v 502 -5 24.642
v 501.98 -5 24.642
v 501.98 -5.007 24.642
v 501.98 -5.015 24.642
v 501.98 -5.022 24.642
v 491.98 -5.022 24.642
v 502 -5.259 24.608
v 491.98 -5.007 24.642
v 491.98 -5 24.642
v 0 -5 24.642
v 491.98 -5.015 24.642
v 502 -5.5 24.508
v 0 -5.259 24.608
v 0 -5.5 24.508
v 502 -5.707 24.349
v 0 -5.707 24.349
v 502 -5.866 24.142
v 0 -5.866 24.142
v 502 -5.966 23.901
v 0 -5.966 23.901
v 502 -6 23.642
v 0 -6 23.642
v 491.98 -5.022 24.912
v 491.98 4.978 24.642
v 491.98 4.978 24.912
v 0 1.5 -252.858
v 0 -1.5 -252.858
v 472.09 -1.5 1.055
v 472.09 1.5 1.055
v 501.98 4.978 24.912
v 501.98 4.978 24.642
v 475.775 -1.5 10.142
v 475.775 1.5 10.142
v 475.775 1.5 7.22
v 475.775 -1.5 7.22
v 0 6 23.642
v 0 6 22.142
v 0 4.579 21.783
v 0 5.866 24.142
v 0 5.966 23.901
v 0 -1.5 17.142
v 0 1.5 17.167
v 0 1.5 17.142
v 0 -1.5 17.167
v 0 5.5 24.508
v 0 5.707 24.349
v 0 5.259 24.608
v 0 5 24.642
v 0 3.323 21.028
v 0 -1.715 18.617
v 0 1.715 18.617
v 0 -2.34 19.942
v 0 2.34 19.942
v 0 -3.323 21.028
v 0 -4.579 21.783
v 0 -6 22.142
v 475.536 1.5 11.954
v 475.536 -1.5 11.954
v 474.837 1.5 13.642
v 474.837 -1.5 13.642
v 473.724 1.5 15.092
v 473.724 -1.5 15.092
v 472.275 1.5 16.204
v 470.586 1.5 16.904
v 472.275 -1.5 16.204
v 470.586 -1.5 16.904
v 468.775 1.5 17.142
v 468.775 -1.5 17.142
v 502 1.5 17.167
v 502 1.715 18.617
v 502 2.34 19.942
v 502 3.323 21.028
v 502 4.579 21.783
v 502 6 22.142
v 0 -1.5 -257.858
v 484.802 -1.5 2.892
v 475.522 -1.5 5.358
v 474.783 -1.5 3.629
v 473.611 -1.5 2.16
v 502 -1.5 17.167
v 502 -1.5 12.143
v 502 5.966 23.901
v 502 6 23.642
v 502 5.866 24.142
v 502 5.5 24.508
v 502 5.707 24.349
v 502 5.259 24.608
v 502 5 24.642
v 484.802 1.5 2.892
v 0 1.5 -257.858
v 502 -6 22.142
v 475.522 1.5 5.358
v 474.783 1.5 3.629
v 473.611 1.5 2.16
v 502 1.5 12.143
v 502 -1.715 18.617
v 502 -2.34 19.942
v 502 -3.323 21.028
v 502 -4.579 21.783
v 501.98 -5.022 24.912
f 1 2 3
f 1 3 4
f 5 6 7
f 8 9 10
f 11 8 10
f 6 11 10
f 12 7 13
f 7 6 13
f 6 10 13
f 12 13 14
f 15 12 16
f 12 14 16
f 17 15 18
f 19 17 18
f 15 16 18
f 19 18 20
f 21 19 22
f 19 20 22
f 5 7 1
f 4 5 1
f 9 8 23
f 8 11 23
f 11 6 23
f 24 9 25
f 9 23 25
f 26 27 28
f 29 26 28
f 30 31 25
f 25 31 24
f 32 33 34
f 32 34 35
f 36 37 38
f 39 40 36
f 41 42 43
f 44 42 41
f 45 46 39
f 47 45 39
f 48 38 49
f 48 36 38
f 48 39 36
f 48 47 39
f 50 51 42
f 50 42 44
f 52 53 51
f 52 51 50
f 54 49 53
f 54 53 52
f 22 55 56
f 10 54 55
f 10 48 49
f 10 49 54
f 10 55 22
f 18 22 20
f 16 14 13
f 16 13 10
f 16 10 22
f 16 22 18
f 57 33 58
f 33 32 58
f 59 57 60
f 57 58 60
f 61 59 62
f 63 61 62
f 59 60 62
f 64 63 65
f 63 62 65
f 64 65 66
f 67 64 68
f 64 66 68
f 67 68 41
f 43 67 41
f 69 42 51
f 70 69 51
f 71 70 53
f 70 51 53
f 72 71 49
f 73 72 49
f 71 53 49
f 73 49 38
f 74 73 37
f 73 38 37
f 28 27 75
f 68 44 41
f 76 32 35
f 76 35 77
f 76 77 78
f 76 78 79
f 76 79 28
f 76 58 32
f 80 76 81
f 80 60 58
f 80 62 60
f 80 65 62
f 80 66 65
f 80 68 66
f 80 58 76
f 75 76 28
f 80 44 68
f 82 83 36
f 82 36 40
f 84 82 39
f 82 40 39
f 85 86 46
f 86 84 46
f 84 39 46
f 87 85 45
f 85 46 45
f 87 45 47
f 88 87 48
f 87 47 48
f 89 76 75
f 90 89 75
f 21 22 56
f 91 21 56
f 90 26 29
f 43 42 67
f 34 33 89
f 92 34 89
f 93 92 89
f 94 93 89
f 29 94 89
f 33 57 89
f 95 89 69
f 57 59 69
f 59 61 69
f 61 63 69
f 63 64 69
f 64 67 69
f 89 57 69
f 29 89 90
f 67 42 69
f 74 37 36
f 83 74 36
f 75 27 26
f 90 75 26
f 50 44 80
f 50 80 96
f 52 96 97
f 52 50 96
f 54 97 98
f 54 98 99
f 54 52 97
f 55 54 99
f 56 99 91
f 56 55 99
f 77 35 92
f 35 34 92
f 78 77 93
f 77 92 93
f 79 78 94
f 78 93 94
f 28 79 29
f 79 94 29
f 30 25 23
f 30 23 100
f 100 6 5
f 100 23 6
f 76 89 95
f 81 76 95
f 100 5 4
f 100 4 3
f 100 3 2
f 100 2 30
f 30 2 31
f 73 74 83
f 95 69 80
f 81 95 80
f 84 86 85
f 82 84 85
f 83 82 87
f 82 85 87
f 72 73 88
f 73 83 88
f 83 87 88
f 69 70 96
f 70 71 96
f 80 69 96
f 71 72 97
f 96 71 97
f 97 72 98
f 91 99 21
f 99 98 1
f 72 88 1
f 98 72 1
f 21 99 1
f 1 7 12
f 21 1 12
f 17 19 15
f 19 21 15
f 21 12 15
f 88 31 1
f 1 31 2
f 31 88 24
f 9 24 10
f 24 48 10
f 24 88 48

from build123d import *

# Parameters (mm, degrees)
F1_DEPTH      = 502
F3_DEPTH      = 406
F4_DEPTH      = 143
F5_W          = 26.22529459
F5_H          = 3
F6_DEPTH      = 14.25
F6_DEPTH_BACK = 0.8
F8_DEPTH      = 25
F10_DEPTH     = 0.27
F11_R         = 7
F12_R         = 7
F13_T1_DEPTH  = 502
F14_T1_DEPTH  = 502
F15_T1_DEPTH  = 507
F15_T6_DEPTH  = 507
F15_T12_DEPTH = 507
F15_T18_DEPTH = 507
F15_T25_DEPTH = 507
F15_T31_DEPTH = 507


# Not quite as in the source:
# - a fillet or chamfer that OpenCascade refuses, or shapes differently, is made with other operations: its cross-section is extruded or revolved along the edge and cut away or added
# - a feature names something its author has since deleted; it is built from what else it names


with BuildPart() as f1:
    # F0 (on Right) → F1 (new body)
    with BuildSketch(Plane.YZ):
        Polygon((6, 24.6420782059), (-6, 24.6420782059), (-6, 22.1420782059), (-1.5, 22.1420782059), (-1.5, -257.8579217941), (1.5, -257.8579217941), (1.5, 22.1420782059), (6, 22.1420782059), align=None)
    extrude(amount=F1_DEPTH)

    # F2 (on face) → F3 (cut)
    with BuildSketch(Plane.XZ.offset(1.5)):
        Polygon((0, -252.8579217941), (502, 17.1420782059), (0, 17.1420782059), align=None)
    extrude(amount=-F3_DEPTH, mode=Mode.SUBTRACT)

    # F2 (on face) → F4 (cut)
    with BuildSketch(Plane.XZ.offset(1.5)):
        Polygon((502, -257.8579217941), (502, 12.1420782059), (0, -257.8579217941), align=None)
    extrude(amount=-F4_DEPTH, mode=Mode.SUBTRACT)

    # F5 (on face) → F6 (join, two sides)
    with BuildSketch(Plane(origin=(0, 0, 17.1420782059), x_dir=(1, 0, 0), z_dir=(0, 0, -1))) as f6_sk:
        with Locations((488.887352705, 0)):
            Rectangle(F5_W, F5_H)
    extrude(amount=F6_DEPTH)
    extrude(f6_sk.sketch, amount=-F6_DEPTH_BACK)

    # F7 (on face) → F8 (cut)
    with BuildSketch(Plane(origin=(0, 1.5, 0), x_dir=(-1, 0, 0), z_dir=(0, 1, 0))):
        Polygon((-484.8018518519, 2.8920782059), (-502, 12.143202126), (-502, 2.8920782059), align=None)
    extrude(amount=-F8_DEPTH, mode=Mode.SUBTRACT)

    # F9 (on face) → F10 (join)
    with BuildSketch(Plane.XY.offset(24.6420782059)):
        Polygon((501.9800190187, -5.0222751118), (501.9800190187, 4.9777248882), (497.843503952, 4.9777248882), (491.9800190187, 4.9777248882), (491.9800190187, -5.0222751118), (496.5066611767, -5.0222751118), align=None)
    extrude(amount=F10_DEPTH)

    # F11
    f11_edges = [f1.edges().sort_by_distance(p)[0] for p in [
        (475.774705, 0, 17.142078),
    ]]
    fillet(f11_edges, radius=F11_R)

    # F12
    f12_edges = [f1.edges().sort_by_distance(p)[0] for p in [
        (475.774705, 0, 3.03684),
    ]]
    fillet(f12_edges, radius=F12_R)

    # F13: fillet of radius 5 on 1 edges, made by hand

    # F13_s2 → F13_t1 (join)
    with BuildSketch(Plane.YZ):
        with BuildLine():
            ThreePointArc((1.5, 17.1671410204), (2.7919007565, 20.5212429867), (6, 22.1420782059))
            Line((6, 22.1420782059), (1.5, 22.1420782059))
            Line((1.5, 22.1420782059), (1.5, 17.1671410204))
        make_face()
    extrude(amount=F13_T1_DEPTH)

    # F14: fillet of radius 5 on 1 edges, made by hand

    # F14_s2 → F14_t1 (join)
    with BuildSketch(Plane.YZ):
        with BuildLine():
            ThreePointArc((-1.5, 17.1671410204), (-2.7919007565, 20.5212429867), (-6, 22.1420782059))
            Line((-6, 22.1420782059), (-1.5, 22.1420782059))
            Line((-1.5, 22.1420782059), (-1.5, 17.1671410204))
        make_face()
    extrude(amount=F14_T1_DEPTH)

    # F15: fillet of radius 1 on 2 edges, made by hand

    # F15_s2 → F15_t1 (cut)
    with BuildSketch(Plane.YZ.offset(-2.5)):
        with BuildLine():
            ThreePointArc((6, 23.6420782059), (5.7071067812, 24.3491849871), (5, 24.6420782059))
            Line((5, 24.6420782059), (6, 24.6420782059))
            Line((6, 24.6420782059), (6, 23.6420782059))
        make_face()
    extrude(amount=F15_T1_DEPTH, mode=Mode.SUBTRACT)


with BuildPart() as f15_tool4:
    # F15_s5 → F15_t6 (new body)
    with BuildSketch(Plane.YZ.offset(-2.5)):
        with BuildLine():
            ThreePointArc((-5, 24.6420782059), (-5.7071067812, 24.3491849871), (-6, 23.6420782059))
            Line((-6, 23.6420782059), (-6, 24.6420782059))
            Line((-6, 24.6420782059), (-5, 24.6420782059))
        make_face()
    extrude(amount=F15_T6_DEPTH)

    split(bisect_by=Plane.YZ.offset(491.9800190187), keep=Keep.BOTTOM)

    split(bisect_by=Plane.XZ.offset(5.0222751118), keep=Keep.BOTTOM)


with BuildPart() as f1_1:
    add(f1.part)

    # F15_t3: cut F15_tool4
    add(f15_tool4.part, mode=Mode.SUBTRACT)


with BuildPart() as f15_tool10:
    # F15_s11 → F15_t12 (new body)
    with BuildSketch(Plane.YZ.offset(-2.5)):
        with BuildLine():
            ThreePointArc((-5, 24.6420782059), (-5.7071067812, 24.3491849871), (-6, 23.6420782059))
            Line((-6, 23.6420782059), (-6, 24.6420782059))
            Line((-6, 24.6420782059), (-5, 24.6420782059))
        make_face()
    extrude(amount=F15_T12_DEPTH)

    split(bisect_by=Plane.YZ.offset(491.9800190187), keep=Keep.BOTTOM)

    split(bisect_by=Plane.XZ.offset(5.0222751118), keep=Keep.TOP)


with BuildPart() as f1_2:
    add(f1_1.part)

    # F15_t9: cut F15_tool10
    add(f15_tool10.part, mode=Mode.SUBTRACT)


with BuildPart() as f15_tool16:
    # F15_s17 → F15_t18 (new body)
    with BuildSketch(Plane.YZ.offset(-2.5)):
        with BuildLine():
            ThreePointArc((-5, 24.6420782059), (-5.7071067812, 24.3491849871), (-6, 23.6420782059))
            Line((-6, 23.6420782059), (-6, 24.6420782059))
            Line((-6, 24.6420782059), (-5, 24.6420782059))
        make_face()
    extrude(amount=F15_T18_DEPTH)

    split(bisect_by=Plane.YZ.offset(491.9800190187), keep=Keep.TOP)

    split(bisect_by=Plane.YZ.offset(501.9800190187), keep=Keep.BOTTOM)

    split(bisect_by=Plane.XZ.offset(5.0222751118), keep=Keep.TOP)


with BuildPart() as f1_3:
    add(f1_2.part)

    # F15_t15: cut F15_tool16
    add(f15_tool16.part, mode=Mode.SUBTRACT)


with BuildPart() as f15_tool23:
    # F15_s24 → F15_t25 (new body)
    with BuildSketch(Plane.YZ.offset(-2.5)):
        with BuildLine():
            ThreePointArc((-5, 24.6420782059), (-5.7071067812, 24.3491849871), (-6, 23.6420782059))
            Line((-6, 23.6420782059), (-6, 24.6420782059))
            Line((-6, 24.6420782059), (-5, 24.6420782059))
        make_face()
    extrude(amount=F15_T25_DEPTH)

    split(bisect_by=Plane.YZ.offset(501.9800190187), keep=Keep.TOP)

    split(bisect_by=Plane.XZ.offset(5.0222751118), keep=Keep.BOTTOM)


with BuildPart() as f1_4:
    add(f1_3.part)

    # F15_t22: cut F15_tool23
    add(f15_tool23.part, mode=Mode.SUBTRACT)


with BuildPart() as f15_tool29:
    # F15_s30 → F15_t31 (new body)
    with BuildSketch(Plane.YZ.offset(-2.5)):
        with BuildLine():
            ThreePointArc((-5, 24.6420782059), (-5.7071067812, 24.3491849871), (-6, 23.6420782059))
            Line((-6, 23.6420782059), (-6, 24.6420782059))
            Line((-6, 24.6420782059), (-5, 24.6420782059))
        make_face()
    extrude(amount=F15_T31_DEPTH)

    split(bisect_by=Plane.YZ.offset(501.9800190187), keep=Keep.TOP)

    split(bisect_by=Plane.XZ.offset(5.0222751118), keep=Keep.TOP)


with BuildPart() as f1_5:
    add(f1_4.part)

    # F15_t28: cut F15_tool29
    add(f15_tool29.part, mode=Mode.SUBTRACT)


solid = f1_5.part
